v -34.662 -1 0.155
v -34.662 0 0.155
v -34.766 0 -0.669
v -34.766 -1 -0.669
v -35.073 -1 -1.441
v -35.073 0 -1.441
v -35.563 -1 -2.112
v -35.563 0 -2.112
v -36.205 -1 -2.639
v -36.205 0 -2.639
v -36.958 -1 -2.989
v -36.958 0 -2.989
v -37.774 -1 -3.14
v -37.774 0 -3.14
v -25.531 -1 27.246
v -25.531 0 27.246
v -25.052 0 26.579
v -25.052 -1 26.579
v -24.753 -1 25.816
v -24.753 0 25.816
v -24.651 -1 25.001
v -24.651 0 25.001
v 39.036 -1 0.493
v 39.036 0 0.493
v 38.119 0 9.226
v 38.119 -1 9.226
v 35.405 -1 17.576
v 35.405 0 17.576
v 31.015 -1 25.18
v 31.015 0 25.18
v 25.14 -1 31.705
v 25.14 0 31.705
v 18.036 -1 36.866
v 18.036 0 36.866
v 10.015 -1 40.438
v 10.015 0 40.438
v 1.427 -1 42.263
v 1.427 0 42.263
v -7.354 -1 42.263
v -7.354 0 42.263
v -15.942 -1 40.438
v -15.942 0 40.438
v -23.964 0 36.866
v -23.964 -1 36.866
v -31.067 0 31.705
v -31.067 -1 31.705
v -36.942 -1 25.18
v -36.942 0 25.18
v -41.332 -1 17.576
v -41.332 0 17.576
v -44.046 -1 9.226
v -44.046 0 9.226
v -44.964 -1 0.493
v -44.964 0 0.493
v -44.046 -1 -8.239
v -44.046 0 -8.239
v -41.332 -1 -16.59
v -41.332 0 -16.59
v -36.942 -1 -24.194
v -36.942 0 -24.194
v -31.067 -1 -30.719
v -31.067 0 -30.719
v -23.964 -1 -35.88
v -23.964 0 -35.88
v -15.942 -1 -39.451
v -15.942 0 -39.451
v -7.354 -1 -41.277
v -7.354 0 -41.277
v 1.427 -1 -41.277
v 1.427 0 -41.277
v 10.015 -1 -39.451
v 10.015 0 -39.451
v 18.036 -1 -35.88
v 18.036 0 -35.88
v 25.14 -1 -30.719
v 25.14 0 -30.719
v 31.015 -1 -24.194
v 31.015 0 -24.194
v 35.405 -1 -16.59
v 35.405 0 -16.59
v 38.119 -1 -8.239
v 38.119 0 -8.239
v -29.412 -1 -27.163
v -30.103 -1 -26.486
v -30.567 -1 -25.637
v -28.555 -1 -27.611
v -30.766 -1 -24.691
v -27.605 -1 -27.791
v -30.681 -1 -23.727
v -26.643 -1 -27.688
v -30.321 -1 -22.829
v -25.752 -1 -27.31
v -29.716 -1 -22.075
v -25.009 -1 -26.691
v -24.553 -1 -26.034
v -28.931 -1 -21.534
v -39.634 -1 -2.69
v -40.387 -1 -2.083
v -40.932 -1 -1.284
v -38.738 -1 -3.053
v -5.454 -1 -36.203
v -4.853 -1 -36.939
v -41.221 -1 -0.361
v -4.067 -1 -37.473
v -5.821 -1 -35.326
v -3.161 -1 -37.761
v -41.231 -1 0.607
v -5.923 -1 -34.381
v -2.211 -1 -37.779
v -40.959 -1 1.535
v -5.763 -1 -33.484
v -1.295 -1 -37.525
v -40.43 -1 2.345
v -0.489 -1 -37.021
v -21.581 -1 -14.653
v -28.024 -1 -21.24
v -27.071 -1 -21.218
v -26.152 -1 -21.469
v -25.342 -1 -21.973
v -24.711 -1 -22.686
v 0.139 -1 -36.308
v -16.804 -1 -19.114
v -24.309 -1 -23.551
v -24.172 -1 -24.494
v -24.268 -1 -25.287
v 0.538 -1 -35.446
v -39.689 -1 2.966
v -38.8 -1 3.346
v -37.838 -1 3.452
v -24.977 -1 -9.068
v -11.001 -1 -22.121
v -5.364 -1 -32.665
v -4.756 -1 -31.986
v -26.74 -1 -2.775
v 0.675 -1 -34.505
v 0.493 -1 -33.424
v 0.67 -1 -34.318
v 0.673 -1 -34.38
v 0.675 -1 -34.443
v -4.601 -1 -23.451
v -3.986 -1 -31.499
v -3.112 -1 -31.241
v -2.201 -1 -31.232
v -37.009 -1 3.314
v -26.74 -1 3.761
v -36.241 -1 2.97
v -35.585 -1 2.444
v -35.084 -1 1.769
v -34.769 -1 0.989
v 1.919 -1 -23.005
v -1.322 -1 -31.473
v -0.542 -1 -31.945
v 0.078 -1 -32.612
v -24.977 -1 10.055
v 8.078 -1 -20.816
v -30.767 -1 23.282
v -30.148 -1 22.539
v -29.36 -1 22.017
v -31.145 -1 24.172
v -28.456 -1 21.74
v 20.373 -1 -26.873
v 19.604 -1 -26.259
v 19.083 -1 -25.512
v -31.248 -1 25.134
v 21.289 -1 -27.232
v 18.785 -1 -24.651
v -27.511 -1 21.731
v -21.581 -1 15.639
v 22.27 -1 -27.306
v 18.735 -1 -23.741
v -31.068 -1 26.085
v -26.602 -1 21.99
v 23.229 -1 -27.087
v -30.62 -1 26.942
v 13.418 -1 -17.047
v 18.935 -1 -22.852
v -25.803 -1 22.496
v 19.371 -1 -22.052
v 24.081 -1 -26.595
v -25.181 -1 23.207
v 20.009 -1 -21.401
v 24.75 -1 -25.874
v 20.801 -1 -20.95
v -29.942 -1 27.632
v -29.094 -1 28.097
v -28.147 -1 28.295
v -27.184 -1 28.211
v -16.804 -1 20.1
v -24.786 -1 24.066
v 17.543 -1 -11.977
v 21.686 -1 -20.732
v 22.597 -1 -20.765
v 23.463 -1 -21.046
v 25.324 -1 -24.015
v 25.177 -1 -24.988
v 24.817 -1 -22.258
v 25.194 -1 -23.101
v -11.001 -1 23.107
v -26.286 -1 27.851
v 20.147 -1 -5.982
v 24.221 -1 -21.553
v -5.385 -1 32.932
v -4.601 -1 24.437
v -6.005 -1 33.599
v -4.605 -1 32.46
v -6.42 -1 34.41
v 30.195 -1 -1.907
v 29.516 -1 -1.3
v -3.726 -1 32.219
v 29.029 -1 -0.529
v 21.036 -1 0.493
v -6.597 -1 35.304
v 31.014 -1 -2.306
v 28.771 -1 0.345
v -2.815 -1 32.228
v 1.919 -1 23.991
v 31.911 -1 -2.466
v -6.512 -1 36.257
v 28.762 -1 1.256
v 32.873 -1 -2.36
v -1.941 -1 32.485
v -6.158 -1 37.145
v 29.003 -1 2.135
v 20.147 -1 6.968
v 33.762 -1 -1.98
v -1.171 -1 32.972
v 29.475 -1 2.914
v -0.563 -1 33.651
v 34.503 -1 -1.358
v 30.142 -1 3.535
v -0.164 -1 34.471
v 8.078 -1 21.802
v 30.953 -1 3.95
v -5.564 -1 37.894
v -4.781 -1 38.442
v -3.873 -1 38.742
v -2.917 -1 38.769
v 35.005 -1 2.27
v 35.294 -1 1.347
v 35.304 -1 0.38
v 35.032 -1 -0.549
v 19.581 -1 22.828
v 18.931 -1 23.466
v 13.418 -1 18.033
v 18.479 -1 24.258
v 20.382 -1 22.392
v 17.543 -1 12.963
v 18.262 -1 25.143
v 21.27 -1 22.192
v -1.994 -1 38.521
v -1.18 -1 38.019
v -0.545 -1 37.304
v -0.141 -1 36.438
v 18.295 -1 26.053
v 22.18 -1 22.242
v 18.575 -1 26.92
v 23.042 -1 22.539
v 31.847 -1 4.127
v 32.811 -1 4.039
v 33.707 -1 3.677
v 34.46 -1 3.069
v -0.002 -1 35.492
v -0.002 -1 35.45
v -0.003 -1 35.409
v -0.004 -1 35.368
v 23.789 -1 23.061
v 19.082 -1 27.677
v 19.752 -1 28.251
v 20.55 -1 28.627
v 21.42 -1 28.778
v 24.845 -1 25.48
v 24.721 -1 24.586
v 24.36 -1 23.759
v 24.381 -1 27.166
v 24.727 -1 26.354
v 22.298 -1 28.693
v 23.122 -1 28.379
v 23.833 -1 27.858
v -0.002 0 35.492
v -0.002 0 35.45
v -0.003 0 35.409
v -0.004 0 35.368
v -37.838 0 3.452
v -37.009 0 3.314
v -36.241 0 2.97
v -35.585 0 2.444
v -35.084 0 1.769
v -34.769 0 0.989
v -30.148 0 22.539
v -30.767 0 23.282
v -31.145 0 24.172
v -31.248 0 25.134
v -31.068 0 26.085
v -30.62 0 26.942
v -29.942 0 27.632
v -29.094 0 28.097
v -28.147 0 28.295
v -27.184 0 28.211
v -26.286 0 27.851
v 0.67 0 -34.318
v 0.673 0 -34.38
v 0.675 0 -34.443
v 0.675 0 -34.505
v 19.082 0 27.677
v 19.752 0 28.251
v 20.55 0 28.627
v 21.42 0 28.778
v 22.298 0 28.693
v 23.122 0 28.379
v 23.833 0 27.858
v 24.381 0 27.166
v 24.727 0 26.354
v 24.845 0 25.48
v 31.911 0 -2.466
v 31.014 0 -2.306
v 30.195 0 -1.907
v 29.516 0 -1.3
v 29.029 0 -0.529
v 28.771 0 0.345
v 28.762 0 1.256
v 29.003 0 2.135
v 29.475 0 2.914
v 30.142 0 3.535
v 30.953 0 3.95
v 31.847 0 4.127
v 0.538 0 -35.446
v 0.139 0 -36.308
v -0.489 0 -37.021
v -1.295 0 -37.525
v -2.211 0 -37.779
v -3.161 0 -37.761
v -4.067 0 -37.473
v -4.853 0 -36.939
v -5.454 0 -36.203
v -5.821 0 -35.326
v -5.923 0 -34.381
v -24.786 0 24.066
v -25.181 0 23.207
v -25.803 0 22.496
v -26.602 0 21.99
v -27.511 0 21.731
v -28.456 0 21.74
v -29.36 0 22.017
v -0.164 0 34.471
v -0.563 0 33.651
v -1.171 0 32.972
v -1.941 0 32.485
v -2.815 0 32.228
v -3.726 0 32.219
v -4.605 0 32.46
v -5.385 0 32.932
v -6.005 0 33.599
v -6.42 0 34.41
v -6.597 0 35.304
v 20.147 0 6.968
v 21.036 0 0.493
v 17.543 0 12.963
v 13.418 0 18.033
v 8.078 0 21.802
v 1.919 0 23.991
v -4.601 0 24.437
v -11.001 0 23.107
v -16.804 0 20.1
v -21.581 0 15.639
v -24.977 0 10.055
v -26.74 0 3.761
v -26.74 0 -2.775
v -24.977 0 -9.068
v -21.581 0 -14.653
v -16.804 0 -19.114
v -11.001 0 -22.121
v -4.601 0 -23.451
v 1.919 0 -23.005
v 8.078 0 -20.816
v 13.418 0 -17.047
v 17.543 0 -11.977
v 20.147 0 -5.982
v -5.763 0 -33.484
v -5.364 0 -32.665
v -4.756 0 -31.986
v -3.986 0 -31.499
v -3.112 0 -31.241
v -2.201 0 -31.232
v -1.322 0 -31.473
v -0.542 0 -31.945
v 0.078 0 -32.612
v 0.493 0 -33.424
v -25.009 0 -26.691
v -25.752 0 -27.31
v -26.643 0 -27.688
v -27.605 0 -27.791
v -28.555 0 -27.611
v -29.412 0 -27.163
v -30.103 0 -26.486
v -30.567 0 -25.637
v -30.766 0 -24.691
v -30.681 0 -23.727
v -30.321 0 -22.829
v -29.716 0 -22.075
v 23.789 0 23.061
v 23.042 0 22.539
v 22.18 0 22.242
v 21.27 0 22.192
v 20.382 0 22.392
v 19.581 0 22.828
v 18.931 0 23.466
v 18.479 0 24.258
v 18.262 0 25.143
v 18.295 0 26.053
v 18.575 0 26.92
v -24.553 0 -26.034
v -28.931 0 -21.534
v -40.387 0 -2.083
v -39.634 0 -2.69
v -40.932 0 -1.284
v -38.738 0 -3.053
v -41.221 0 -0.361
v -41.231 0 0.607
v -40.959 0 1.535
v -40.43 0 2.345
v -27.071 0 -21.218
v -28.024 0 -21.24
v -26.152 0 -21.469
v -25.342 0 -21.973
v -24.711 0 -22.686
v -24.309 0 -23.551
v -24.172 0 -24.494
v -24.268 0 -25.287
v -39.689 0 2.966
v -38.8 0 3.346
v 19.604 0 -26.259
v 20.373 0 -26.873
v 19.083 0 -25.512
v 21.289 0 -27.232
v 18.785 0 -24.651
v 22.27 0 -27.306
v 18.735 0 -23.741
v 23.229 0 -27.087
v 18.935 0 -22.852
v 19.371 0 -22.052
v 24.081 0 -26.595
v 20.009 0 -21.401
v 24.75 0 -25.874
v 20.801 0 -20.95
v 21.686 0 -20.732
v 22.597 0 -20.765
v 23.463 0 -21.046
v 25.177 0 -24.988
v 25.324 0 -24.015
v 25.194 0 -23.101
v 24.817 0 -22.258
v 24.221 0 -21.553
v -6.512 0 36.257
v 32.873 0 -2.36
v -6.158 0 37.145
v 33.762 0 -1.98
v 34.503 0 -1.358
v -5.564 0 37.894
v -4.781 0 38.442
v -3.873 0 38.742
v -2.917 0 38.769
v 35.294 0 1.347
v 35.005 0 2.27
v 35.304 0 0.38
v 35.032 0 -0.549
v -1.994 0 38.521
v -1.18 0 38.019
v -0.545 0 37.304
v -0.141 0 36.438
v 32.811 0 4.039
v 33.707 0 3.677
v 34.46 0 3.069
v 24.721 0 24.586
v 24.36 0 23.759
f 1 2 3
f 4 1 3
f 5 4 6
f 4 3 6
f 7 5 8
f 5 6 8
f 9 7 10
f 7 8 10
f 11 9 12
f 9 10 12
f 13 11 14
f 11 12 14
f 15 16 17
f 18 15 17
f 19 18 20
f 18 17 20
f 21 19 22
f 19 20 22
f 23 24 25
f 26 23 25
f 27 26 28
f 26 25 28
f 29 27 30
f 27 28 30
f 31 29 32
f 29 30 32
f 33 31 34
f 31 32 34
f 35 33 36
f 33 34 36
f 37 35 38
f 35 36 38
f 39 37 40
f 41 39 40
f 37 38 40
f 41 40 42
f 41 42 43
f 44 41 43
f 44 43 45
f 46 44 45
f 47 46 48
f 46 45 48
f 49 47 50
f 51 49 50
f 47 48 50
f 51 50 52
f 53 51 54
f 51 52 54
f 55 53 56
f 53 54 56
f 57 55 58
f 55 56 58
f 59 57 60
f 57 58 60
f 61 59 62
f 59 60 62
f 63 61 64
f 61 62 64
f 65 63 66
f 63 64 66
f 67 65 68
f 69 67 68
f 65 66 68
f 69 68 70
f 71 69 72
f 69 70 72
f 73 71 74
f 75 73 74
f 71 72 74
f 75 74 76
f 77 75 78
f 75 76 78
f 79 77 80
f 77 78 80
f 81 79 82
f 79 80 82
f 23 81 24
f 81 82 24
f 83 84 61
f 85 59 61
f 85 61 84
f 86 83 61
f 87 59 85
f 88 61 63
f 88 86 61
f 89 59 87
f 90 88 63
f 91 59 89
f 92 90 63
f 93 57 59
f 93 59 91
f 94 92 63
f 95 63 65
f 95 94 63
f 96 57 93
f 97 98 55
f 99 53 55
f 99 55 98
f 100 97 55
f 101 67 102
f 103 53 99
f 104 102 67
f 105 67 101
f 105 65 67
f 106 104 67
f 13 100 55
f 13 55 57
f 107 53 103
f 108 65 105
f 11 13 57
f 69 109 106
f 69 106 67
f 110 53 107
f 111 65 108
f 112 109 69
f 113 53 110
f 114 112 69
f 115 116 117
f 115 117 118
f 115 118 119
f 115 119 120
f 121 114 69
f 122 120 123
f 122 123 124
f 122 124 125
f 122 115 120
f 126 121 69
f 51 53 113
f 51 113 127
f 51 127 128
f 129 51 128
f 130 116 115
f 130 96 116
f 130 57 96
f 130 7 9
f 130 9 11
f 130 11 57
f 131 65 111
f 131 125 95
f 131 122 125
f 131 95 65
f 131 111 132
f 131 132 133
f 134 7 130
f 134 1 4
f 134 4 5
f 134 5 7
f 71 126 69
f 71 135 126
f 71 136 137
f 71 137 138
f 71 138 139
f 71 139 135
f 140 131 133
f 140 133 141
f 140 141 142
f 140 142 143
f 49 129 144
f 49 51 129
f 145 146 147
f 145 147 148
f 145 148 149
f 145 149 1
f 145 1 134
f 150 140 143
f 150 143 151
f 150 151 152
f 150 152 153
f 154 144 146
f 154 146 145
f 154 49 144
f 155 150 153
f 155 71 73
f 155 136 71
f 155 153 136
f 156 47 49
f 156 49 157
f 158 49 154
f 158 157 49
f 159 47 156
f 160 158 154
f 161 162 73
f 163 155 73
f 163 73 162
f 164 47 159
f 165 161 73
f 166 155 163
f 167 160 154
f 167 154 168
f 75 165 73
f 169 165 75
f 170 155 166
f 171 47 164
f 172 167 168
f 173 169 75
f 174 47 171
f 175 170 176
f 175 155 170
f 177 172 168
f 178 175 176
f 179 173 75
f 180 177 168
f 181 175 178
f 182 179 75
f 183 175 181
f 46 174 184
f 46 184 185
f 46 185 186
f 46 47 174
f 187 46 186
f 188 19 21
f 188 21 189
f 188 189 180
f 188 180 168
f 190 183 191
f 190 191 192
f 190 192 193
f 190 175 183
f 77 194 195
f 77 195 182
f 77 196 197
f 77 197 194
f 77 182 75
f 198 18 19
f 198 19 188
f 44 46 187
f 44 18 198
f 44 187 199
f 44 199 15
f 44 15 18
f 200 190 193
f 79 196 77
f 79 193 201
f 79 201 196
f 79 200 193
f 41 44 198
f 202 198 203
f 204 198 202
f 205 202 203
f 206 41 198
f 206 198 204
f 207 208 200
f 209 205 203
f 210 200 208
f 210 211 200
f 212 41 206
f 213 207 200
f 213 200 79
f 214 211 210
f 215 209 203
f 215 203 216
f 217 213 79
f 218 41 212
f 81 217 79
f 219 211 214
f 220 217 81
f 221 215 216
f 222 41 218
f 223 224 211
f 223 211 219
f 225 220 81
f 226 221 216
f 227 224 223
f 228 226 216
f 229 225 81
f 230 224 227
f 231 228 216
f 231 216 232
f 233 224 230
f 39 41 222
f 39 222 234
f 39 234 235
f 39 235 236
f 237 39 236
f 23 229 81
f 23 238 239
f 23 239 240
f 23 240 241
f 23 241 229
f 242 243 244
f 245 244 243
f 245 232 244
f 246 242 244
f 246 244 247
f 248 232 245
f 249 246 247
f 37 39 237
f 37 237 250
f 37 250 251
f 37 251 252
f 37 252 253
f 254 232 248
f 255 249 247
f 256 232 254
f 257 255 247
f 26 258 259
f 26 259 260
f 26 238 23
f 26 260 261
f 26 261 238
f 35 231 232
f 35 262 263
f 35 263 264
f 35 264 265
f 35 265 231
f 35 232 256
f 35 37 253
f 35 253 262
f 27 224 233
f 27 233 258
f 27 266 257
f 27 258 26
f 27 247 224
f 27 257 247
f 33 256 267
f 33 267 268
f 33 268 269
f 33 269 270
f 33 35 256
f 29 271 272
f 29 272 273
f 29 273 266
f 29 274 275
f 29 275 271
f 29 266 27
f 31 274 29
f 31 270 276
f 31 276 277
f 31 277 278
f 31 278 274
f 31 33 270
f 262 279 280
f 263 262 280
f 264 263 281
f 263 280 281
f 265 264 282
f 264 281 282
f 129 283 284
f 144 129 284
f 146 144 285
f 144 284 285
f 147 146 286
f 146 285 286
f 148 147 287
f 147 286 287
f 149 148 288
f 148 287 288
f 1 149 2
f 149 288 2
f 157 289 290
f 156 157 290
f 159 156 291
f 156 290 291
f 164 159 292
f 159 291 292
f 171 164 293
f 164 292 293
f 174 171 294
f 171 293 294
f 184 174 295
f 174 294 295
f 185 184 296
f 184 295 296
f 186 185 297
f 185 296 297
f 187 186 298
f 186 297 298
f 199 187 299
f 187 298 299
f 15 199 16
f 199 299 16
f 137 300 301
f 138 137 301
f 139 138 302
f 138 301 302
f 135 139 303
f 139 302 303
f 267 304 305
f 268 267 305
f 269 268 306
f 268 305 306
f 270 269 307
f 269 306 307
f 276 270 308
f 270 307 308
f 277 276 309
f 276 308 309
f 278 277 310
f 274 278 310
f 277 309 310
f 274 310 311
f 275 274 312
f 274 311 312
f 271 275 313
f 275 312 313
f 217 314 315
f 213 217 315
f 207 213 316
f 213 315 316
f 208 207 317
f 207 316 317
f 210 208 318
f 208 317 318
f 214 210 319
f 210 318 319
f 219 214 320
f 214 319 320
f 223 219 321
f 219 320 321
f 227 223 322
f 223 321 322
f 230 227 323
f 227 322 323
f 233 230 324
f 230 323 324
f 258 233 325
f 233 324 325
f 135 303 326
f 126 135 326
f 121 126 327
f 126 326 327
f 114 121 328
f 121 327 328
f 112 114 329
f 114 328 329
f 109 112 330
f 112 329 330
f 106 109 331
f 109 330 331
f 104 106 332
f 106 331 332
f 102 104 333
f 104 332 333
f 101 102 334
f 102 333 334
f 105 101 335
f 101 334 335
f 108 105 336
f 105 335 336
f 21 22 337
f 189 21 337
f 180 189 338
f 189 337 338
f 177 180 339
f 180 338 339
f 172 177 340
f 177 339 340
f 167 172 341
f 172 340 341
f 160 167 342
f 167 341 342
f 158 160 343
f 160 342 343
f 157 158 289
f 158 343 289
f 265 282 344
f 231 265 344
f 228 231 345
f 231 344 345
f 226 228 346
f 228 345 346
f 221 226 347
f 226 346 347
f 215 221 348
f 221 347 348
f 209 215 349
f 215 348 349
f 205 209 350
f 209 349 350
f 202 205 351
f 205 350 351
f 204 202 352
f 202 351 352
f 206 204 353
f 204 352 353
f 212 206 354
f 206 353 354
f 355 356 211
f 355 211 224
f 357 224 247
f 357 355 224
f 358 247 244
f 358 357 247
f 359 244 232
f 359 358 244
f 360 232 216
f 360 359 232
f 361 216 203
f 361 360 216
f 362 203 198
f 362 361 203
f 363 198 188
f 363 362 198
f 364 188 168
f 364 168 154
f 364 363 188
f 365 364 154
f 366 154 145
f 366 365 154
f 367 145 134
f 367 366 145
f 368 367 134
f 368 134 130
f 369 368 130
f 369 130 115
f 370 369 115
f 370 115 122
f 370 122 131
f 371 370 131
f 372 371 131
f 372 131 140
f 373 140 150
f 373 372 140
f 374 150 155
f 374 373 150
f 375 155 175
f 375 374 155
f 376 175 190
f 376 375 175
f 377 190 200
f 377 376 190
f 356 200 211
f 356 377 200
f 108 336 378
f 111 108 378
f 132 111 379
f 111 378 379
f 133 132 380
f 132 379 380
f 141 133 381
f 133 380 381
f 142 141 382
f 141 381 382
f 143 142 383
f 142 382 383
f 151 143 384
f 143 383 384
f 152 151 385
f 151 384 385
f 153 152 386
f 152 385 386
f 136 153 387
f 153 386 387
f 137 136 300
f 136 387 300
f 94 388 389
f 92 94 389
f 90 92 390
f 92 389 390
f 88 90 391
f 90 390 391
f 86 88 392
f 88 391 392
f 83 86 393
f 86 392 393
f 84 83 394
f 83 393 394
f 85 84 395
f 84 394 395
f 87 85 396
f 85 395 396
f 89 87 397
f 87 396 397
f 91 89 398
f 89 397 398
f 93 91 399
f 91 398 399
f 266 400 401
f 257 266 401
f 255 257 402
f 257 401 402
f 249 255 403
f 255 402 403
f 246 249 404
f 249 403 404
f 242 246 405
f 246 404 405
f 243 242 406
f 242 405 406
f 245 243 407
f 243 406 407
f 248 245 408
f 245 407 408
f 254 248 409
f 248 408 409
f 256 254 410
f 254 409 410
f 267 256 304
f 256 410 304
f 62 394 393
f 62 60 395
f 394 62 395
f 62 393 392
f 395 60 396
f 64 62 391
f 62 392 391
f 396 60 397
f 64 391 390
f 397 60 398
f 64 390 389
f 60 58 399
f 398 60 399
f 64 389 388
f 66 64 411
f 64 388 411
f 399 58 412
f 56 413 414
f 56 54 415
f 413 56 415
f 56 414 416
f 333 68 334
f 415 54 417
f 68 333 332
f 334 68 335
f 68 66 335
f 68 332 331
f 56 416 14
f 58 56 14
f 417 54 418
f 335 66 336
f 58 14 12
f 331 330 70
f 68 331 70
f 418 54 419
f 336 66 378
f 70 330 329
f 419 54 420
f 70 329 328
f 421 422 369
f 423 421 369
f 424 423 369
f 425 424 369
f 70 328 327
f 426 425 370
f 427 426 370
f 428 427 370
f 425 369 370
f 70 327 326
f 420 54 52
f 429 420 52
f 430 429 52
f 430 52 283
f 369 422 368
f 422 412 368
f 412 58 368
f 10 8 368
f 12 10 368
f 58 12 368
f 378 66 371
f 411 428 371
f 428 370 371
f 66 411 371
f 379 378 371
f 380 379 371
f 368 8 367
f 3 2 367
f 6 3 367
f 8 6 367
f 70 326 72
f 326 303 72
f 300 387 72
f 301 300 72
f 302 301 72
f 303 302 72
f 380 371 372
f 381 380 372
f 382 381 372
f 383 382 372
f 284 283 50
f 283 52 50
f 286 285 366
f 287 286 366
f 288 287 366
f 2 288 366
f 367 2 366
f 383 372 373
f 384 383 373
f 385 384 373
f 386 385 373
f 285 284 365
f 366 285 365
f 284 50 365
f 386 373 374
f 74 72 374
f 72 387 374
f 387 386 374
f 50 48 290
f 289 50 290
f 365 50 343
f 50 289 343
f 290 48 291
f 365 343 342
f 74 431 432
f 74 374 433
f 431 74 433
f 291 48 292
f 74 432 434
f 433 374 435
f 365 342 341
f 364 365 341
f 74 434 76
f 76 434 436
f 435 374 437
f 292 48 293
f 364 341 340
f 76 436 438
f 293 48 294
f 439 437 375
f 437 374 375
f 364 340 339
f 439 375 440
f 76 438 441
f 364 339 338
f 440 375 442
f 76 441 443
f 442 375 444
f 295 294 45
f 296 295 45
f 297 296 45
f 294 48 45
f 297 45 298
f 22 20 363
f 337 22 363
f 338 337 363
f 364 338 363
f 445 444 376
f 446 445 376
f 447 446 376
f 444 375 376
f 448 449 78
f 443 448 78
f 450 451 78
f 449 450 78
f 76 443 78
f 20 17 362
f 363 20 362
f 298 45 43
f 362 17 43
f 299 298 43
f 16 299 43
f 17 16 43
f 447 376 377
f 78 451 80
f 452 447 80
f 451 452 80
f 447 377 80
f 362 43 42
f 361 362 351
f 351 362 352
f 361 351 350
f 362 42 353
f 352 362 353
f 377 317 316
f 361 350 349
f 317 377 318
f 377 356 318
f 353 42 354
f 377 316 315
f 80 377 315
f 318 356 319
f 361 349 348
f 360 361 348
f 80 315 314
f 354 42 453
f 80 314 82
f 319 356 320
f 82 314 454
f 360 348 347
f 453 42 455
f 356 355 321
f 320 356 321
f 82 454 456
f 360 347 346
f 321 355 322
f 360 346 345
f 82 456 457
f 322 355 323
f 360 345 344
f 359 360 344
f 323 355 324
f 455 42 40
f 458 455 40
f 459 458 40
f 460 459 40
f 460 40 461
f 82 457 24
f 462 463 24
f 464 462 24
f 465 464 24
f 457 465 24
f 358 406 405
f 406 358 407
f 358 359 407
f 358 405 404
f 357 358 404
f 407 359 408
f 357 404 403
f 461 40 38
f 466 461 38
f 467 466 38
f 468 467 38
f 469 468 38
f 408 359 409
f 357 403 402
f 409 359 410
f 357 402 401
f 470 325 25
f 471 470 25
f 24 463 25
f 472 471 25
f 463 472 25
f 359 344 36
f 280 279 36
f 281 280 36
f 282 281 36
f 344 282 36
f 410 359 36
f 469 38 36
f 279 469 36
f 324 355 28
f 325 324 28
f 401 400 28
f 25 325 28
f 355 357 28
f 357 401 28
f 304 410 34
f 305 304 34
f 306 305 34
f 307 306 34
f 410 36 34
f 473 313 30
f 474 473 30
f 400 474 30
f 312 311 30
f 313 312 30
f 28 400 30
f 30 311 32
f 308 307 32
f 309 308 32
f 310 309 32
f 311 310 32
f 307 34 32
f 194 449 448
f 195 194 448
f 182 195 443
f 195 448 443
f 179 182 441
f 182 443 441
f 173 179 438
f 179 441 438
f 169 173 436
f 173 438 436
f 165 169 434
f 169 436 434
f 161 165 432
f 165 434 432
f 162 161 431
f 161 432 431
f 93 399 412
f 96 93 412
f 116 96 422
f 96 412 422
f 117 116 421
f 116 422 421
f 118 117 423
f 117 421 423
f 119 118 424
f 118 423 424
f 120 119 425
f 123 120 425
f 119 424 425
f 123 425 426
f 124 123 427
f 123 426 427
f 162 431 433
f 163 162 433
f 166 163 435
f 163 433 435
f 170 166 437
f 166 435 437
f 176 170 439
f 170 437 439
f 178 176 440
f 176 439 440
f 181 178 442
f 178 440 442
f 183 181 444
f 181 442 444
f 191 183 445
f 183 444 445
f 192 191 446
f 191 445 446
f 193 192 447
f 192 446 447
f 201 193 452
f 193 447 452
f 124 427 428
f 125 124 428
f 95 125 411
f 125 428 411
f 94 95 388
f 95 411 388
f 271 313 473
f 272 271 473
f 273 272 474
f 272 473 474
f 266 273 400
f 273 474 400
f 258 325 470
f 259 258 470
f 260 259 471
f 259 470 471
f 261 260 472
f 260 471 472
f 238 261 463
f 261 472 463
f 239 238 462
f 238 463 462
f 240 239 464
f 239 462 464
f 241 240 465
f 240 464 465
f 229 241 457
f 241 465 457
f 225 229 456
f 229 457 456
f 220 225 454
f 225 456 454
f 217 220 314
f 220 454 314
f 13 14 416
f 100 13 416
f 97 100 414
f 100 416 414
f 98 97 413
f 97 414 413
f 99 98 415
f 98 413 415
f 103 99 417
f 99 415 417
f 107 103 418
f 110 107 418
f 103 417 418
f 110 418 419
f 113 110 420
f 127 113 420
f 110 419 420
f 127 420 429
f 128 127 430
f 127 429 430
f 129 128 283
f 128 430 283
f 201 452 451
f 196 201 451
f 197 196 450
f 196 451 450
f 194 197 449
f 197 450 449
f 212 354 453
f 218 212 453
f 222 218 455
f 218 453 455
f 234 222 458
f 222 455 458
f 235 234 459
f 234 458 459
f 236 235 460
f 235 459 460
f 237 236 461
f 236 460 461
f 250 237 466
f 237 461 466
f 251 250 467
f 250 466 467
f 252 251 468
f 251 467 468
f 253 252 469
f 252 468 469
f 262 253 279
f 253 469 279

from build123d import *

# Parameters (mm, degrees)
F0_R     = 42
F0_R_2   = 24
F1_DEPTH = 1


with BuildPart() as f1:
    # F0 (on Front) → F1 (new body)
    with BuildSketch(Plane.XZ):
        with Locations((-2.9635038227, 0.4932200536)):
            Circle(F0_R)
        with BuildLine():
            ThreePointArc((23.788972617, 23.0610069266), (29.2411666686, 14.199393792), (31.8473983055, 4.1265508975))
            ThreePointArc((31.8473983055, 4.1265508975), (34.3010642257, 3.2306934737), (35.3348577063, 0.8318795978))
            ThreePointArc((35.3348577063, 0.8318795978), (34.3241690286, -1.5448941966), (31.9111888156, -2.4658023161))
            ThreePointArc((31.9111888156, -2.4658023161), (29.5003654621, -12.5871924421), (24.2206740094, -21.5526520225))
            ThreePointArc((24.2206740094, -21.5526520225), (25.0352315525, -22.6659149008), (25.3235434051, -24.0148902537))
            ThreePointArc((25.3235434051, -24.0148902537), (23.2290393257, -27.0868244303), (19.6042830503, -26.2592563861))
            ThreePointArc((19.6042830503, -26.2592563861), (10.7426699157, -31.7114504377), (0.6698270212, -34.3176820746))
            ThreePointArc((0.6698270212, -34.3176820746), (0.6738232774, -34.4113739144), (0.6751557215, -34.5051414754))
            ThreePointArc((0.6751557215, -34.5051414754), (-2.6866895856, -37.804561903), (-5.9225261924, -34.3814725847))
            ThreePointArc((-5.9225261924, -34.3814725847), (-16.0439163184, -31.9706492312), (-25.0093758988, -26.6909577785))
            ThreePointArc((-25.0093758988, -26.6909577785), (-29.7823788162, -26.8497487699), (-29.7159802624, -22.0745668194))
            ThreePointArc((-29.7159802624, -22.0745668194), (-35.168174314, -13.2129536848), (-37.7744059509, -3.1401107903))
            ThreePointArc((-37.7744059509, -3.1401107903), (-41.2617108673, 0.1226297524), (-37.838196461, 3.4522424234))
            ThreePointArc((-37.838196461, 3.4522424234), (-35.4273731075, 13.5736325493), (-30.1476816547, 22.5390921297))
            ThreePointArc((-30.1476816547, 22.5390921297), (-30.3064726462, 27.3120950471), (-25.5312906957, 27.2456964933))
            ThreePointArc((-25.5312906957, 27.2456964933), (-16.6696775611, 32.6978905449), (-6.5968346666, 35.3041221818))
            ThreePointArc((-6.5968346666, 35.3041221818), (-3.3959309279, 38.7902491385), (-0.0021633669, 35.4915815826))
            ThreePointArc((-0.0021633669, 35.4915815826), (-0.0027429393, 35.4297362755), (-0.0044814529, 35.3679126919))
            ThreePointArc((-0.0044814529, 35.3679126919), (10.116908673, 32.9570893384), (19.0823682534, 27.6773978857))
            ThreePointArc((19.0823682534, 27.6773978857), (22.7203219768, 28.5637220129), (24.8446064847, 25.4802672814))
            ThreePointArc((24.8446064847, 25.4802672814), (24.5692063125, 24.1604961339), (23.788972617, 23.0610069266))
        make_face(mode=Mode.SUBTRACT)
        with BuildLine():
            ThreePointArc((31.9111888156, -2.4658023161), (28.7350121907, 0.7999488408), (31.8473983055, 4.1265508975))
            ThreePointArc((31.8473983055, 4.1265508975), (29.2411666686, 14.199393792), (23.788972617, 23.0610069266))
            ThreePointArc((23.788972617, 23.0610069266), (19.2338417986, 23.1243456856), (19.0823682534, 27.6773978857))
            ThreePointArc((19.0823682534, 27.6773978857), (10.116908673, 32.9570893384), (-0.0044814529, 35.3679126919))
            ThreePointArc((-0.0044814529, 35.3679126919), (-3.2702326098, 32.191736067), (-6.5968346666, 35.3041221818))
            ThreePointArc((-6.5968346666, 35.3041221818), (-16.6696775611, 32.6978905449), (-25.5312906957, 27.2456964933))
            ThreePointArc((-25.5312906957, 27.2456964933), (-24.8786168738, 26.2068262816), (-24.6505510504, 25.001330361))
            ThreePointArc((-24.6505510504, 25.001330361), (-26.6015756975, 21.9896422136), (-30.1476816547, 22.5390921297))
            ThreePointArc((-30.1476816547, 22.5390921297), (-35.4273731075, 13.5736325493), (-37.838196461, 3.4522424234))
            ThreePointArc((-37.838196461, 3.4522424234), (-35.5850915573, 2.4438718317), (-34.6618653517, 0.1545605094))
            ThreePointArc((-34.6618653517, 0.1545605094), (-35.5630514757, -2.11164601), (-37.7744059509, -3.1401107903))
            ThreePointArc((-37.7744059509, -3.1401107903), (-35.168174314, -13.2129536848), (-29.7159802624, -22.0745668194))
            ThreePointArc((-29.7159802624, -22.0745668194), (-26.1518429826, -21.4692273463), (-24.17161413, -24.4938271741))
            ThreePointArc((-24.17161413, -24.4938271741), (-24.3881593985, -25.6695426662), (-25.0093758988, -26.6909577785))
            ThreePointArc((-25.0093758988, -26.6909577785), (-16.0439163184, -31.9706492312), (-5.9225261924, -34.3814725847))
            ThreePointArc((-5.9225261924, -34.3814725847), (-2.6567750355, -31.2052959598), (0.6698270212, -34.3176820746))
            ThreePointArc((0.6698270212, -34.3176820746), (10.7426699157, -31.7114504377), (19.6042830503, -26.2592563861))
            ThreePointArc((19.6042830503, -26.2592563861), (19.6676218093, -21.7041255676), (24.2206740094, -21.5526520225))
            ThreePointArc((24.2206740094, -21.5526520225), (29.5003654621, -12.5871924421), (31.9111888156, -2.4658023161))
        make_face()
        with Locations((-2.9635038227, 0.4932200536)):
            Circle(F0_R_2, mode=Mode.SUBTRACT)
    extrude(amount=F1_DEPTH)


solid = f1.part
